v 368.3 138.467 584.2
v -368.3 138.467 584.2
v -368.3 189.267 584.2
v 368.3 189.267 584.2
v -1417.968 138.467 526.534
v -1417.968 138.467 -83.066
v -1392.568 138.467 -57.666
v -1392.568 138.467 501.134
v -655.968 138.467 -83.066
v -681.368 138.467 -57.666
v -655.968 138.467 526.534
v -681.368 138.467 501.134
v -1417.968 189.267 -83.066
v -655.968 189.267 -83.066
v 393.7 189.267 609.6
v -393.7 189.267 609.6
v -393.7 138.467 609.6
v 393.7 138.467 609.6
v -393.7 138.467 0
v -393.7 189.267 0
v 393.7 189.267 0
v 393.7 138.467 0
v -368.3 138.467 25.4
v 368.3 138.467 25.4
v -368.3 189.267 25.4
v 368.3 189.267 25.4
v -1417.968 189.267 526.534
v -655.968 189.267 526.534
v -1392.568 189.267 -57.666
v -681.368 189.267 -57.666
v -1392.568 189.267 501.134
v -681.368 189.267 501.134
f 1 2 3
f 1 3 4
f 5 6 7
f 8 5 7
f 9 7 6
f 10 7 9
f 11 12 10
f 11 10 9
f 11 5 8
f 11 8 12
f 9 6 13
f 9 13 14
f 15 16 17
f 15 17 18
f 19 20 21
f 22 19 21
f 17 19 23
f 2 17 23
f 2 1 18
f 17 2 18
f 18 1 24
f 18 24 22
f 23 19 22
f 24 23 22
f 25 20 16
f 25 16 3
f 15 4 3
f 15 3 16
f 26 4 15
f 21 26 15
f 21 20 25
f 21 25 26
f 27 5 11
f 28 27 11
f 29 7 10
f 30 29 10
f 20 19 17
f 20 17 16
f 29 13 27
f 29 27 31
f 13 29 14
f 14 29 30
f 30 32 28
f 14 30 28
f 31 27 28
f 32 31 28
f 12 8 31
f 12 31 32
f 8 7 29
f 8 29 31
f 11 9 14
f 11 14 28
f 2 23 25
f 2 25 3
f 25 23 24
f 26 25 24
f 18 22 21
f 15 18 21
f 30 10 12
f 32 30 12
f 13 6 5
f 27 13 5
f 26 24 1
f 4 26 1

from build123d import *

# Parameters (mm, degrees)
F0_W     = 787.4
F0_H     = 50.8
F1_DEPTH = 609.6
F2_W     = 736.6
F2_H     = 558.8
F3_DEPTH = 50.8
F4_W     = 762
F4_H     = 609.6
F5_DEPTH = 50.8
F6_W     = 711.2
F6_H     = 558.8
F7_DEPTH = 50.8


with BuildPart() as f1:
    # F0 (on Top) → F1 (new body)
    with BuildSketch(Plane.XY):
        with Locations((0, 163.867116)):
            Rectangle(F0_W, F0_H)
    extrude(amount=F1_DEPTH)

    # F2 (on face) → F3 (cut)
    with BuildSketch(Plane.XZ.offset(-138.467116)):
        with Locations((0, 304.8)):
            Rectangle(F2_W, F2_H)
    extrude(amount=-F3_DEPTH, mode=Mode.SUBTRACT)


with BuildPart() as f5:
    # F4 (on face) → F5 (new body)
    with BuildSketch(Plane.XZ.offset(-138.467116)):
        with Locations((-1036.968154, 221.734259)):
            Rectangle(F4_W, F4_H)
    extrude(amount=-F5_DEPTH)

    # F6 (on face) → F7 (cut)
    with BuildSketch(Plane.XZ.offset(-138.467116)):
        with Locations((-1036.968154, 221.734259)):
            Rectangle(F6_W, F6_H)
    extrude(amount=-F7_DEPTH, mode=Mode.SUBTRACT)


solid = Compound([f1.part, f5.part])
